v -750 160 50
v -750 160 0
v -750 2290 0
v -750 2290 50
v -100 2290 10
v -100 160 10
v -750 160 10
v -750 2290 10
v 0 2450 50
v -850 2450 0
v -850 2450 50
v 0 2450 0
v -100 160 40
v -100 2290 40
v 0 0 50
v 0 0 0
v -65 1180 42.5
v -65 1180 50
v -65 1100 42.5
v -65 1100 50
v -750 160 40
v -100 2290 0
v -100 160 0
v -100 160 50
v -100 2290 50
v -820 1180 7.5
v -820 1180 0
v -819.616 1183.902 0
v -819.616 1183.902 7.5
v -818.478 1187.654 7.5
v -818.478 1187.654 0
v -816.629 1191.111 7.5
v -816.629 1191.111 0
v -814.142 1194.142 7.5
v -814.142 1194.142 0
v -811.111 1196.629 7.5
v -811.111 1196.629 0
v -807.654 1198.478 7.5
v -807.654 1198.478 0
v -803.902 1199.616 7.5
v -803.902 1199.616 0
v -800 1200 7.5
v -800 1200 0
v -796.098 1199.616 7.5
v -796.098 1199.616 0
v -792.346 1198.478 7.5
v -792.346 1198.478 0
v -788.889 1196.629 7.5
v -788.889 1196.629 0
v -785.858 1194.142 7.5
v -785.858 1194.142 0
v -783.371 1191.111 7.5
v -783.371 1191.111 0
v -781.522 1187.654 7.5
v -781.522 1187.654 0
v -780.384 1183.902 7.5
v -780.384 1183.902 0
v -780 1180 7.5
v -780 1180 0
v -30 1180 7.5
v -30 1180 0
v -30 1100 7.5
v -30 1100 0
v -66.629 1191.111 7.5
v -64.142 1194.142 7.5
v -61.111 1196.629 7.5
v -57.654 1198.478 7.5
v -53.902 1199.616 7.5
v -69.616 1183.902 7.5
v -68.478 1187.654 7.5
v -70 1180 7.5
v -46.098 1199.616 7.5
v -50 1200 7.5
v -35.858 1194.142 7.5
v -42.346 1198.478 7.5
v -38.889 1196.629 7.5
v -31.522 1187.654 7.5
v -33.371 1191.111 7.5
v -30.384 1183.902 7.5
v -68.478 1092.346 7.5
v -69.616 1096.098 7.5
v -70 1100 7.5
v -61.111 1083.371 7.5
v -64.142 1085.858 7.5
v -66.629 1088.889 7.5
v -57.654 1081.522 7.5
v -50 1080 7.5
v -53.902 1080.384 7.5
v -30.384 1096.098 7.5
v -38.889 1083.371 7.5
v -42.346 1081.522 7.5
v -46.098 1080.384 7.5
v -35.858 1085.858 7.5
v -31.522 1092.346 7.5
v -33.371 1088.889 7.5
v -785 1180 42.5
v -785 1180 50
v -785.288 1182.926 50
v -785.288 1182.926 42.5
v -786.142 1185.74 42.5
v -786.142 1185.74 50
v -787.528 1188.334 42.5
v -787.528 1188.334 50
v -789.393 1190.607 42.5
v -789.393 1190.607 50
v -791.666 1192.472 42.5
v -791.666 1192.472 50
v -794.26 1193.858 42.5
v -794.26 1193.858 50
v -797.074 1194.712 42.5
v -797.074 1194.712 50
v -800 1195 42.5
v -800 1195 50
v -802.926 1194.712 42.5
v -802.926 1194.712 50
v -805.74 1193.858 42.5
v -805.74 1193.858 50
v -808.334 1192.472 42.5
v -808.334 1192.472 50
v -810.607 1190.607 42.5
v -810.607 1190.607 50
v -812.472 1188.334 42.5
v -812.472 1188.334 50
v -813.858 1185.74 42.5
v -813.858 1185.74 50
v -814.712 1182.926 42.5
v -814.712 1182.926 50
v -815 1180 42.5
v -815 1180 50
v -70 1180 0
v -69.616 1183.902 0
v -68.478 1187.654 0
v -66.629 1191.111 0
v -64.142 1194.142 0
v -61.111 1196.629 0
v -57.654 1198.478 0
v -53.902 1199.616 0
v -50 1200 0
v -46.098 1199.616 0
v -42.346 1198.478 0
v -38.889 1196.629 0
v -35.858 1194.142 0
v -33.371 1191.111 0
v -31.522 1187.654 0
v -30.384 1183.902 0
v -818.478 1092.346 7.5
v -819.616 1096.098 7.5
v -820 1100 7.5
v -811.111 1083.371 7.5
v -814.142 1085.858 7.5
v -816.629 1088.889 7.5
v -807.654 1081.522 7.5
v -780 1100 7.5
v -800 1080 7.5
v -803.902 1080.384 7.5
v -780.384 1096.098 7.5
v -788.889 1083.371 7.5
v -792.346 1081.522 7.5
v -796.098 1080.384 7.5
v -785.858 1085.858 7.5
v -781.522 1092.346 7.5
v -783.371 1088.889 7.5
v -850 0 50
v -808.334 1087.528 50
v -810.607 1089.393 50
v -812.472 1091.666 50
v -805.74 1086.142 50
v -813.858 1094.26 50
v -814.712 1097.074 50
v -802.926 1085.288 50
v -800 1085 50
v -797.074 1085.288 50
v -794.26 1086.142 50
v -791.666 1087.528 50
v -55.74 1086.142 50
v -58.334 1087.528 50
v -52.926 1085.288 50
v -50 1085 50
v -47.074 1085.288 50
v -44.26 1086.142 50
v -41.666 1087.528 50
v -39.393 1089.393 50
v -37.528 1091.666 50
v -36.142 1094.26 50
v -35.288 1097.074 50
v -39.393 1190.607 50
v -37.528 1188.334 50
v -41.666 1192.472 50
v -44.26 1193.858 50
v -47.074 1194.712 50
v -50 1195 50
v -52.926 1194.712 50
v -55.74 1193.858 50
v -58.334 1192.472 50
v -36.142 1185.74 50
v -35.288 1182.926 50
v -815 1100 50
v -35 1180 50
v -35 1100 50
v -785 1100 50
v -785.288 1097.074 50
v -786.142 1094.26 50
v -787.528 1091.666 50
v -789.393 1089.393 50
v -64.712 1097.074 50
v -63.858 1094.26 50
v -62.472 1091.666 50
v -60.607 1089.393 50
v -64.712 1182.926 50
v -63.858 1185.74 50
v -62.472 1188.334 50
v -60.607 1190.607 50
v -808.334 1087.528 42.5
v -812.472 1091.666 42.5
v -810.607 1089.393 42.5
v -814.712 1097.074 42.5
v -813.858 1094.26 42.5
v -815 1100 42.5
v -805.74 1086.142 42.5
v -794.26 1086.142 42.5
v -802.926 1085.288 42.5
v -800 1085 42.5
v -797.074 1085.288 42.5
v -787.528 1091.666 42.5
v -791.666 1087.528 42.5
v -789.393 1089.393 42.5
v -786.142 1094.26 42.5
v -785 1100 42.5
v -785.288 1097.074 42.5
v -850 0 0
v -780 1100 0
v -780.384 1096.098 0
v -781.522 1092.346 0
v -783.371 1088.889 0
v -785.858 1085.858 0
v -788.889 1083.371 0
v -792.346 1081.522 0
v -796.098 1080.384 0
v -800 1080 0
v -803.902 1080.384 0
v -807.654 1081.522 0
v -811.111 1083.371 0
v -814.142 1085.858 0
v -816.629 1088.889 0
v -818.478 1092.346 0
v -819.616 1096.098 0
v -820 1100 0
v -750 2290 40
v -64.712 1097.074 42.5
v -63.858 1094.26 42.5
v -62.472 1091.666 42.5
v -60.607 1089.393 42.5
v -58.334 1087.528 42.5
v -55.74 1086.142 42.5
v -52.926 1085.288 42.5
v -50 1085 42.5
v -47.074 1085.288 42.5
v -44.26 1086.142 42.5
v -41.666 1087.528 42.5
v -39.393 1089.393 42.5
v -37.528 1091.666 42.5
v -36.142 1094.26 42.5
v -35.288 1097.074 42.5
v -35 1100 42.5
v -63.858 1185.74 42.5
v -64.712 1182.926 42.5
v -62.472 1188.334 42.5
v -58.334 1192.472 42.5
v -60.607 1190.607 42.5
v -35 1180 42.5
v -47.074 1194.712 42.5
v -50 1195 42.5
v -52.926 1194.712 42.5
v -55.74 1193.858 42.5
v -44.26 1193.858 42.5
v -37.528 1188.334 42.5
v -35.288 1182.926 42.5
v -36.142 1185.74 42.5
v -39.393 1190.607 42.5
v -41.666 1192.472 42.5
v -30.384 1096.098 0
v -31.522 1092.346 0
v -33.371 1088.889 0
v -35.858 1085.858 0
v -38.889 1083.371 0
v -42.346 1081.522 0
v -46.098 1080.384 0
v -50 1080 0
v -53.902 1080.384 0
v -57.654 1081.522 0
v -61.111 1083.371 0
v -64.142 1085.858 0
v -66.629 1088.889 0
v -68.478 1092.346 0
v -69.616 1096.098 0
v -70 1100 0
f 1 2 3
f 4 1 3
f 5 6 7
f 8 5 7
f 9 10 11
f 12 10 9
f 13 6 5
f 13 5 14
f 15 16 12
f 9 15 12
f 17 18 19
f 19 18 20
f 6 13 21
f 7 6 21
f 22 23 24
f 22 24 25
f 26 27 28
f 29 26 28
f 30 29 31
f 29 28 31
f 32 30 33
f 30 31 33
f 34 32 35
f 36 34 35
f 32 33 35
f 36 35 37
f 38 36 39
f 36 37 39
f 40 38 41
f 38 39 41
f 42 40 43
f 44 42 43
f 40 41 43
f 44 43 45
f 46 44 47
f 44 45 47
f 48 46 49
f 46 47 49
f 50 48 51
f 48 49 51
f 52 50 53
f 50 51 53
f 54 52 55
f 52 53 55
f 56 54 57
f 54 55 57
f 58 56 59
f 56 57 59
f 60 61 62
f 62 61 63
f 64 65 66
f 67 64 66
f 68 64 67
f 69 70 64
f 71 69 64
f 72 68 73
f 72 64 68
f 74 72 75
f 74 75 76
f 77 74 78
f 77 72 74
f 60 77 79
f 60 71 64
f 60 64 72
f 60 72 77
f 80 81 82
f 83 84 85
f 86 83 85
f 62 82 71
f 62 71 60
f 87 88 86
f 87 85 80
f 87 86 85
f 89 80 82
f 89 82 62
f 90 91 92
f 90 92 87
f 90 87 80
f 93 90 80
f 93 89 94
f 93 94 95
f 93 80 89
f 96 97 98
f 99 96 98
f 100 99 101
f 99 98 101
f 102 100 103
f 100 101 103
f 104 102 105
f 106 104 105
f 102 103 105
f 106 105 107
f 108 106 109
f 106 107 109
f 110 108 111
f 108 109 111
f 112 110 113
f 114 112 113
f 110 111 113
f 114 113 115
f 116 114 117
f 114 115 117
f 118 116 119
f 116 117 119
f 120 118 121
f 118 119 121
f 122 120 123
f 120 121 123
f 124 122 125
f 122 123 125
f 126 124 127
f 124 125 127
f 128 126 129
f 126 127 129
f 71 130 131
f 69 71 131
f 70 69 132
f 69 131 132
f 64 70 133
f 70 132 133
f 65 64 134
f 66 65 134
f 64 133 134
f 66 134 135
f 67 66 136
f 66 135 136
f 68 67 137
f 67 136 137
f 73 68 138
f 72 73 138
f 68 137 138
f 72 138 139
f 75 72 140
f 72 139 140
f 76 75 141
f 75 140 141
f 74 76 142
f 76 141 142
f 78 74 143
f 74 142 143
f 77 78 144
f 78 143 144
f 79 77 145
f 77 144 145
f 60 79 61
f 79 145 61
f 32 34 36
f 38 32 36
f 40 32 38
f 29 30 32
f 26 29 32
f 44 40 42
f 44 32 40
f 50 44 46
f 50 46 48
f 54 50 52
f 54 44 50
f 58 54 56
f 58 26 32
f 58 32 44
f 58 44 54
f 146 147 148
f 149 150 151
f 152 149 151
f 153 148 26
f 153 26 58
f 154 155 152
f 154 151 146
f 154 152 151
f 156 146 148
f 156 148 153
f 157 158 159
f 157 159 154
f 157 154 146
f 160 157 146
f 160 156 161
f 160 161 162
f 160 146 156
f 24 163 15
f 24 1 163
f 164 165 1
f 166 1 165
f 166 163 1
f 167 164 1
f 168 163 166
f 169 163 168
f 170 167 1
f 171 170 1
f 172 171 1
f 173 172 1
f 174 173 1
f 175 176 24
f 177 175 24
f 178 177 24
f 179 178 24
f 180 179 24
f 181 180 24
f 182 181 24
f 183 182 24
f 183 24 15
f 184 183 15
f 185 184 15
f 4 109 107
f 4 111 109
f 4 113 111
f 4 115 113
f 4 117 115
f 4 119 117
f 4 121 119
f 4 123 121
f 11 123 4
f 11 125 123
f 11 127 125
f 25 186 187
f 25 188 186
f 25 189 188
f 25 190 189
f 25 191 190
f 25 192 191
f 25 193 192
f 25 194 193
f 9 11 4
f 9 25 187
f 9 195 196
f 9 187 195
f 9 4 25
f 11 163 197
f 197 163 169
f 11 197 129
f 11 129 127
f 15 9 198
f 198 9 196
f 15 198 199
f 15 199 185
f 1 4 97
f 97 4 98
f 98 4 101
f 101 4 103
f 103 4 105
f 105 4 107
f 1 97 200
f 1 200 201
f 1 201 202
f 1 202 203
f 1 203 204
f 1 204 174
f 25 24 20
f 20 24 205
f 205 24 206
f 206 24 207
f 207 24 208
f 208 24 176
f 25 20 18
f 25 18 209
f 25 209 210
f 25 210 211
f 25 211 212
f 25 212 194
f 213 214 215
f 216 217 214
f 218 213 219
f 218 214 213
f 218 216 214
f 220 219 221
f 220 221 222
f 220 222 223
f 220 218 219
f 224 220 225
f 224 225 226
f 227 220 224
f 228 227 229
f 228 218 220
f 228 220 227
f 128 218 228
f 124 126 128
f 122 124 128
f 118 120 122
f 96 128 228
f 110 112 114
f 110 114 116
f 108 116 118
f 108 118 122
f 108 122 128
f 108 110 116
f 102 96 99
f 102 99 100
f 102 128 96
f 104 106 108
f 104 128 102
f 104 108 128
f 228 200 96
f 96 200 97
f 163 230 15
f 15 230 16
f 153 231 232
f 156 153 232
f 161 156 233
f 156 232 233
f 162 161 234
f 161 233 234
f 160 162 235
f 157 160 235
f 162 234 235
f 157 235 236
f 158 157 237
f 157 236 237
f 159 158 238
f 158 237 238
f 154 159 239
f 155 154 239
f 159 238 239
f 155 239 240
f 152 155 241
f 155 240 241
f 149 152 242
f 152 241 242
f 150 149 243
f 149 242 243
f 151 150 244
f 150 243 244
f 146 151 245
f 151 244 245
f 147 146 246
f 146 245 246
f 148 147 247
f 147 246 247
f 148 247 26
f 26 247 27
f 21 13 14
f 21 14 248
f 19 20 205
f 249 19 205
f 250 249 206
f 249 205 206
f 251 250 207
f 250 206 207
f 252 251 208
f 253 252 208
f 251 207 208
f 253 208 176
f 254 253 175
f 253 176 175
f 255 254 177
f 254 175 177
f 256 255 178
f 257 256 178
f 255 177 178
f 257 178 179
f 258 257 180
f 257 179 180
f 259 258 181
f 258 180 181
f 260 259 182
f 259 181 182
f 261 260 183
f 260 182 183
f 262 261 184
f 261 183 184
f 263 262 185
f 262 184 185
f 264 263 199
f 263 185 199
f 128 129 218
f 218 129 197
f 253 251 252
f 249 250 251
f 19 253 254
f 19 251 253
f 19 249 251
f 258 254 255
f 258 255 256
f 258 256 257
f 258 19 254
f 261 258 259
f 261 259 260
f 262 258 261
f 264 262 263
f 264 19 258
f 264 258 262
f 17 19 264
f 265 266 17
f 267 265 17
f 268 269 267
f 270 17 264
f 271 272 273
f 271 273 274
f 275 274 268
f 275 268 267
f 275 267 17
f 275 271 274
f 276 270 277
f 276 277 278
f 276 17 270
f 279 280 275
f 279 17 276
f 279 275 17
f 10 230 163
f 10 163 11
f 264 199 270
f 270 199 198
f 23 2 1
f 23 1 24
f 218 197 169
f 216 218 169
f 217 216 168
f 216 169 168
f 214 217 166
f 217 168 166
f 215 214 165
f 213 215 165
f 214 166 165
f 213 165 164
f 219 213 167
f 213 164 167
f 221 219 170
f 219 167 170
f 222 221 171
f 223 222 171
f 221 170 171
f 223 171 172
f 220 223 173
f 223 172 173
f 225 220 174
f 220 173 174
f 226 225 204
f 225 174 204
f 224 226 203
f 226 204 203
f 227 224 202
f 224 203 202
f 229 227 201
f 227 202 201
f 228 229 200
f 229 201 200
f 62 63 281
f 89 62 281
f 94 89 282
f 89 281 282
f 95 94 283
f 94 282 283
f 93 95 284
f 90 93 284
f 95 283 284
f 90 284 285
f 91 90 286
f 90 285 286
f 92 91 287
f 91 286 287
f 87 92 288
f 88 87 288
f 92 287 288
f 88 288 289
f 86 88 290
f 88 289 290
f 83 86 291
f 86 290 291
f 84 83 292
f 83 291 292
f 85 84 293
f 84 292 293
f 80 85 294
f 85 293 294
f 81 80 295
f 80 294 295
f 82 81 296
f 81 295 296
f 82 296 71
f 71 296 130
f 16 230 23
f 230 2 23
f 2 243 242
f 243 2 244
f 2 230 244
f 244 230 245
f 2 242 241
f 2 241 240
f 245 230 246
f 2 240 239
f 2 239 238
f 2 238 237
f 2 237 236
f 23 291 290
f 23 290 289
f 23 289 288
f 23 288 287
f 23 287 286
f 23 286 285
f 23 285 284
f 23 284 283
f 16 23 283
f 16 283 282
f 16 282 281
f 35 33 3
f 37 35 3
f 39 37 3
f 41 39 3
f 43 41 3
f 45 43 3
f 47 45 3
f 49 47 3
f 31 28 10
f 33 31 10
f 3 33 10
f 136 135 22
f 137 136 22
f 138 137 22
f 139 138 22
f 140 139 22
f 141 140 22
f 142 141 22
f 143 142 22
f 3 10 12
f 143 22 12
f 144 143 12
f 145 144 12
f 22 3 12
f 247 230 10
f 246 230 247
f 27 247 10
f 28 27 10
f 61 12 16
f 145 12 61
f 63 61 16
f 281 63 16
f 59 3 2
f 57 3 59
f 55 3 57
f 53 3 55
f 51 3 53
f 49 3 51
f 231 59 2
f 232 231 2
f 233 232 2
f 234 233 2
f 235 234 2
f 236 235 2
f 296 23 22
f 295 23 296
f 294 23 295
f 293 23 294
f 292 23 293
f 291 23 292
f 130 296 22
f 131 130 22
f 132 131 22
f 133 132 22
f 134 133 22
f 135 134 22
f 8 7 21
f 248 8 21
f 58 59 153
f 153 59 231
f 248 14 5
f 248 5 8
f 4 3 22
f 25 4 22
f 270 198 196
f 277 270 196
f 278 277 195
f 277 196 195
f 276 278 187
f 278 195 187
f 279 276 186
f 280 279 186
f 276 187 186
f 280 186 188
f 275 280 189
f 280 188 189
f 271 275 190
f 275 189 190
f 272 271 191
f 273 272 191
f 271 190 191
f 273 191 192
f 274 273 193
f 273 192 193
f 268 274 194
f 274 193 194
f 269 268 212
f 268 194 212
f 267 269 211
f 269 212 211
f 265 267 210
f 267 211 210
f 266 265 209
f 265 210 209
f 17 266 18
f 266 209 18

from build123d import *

# Parameters (mm, degrees)
F0_W     = 850
F0_H     = 2450
F0_W_2   = 650
F0_H_2   = 2130
F1_DEPTH = 50
F2_W     = 650
F2_H     = 30
F3_DEPTH = 2130
F5_DEPTH = 7.5
F7_DEPTH = 7.5


with BuildPart() as f1:
    # F0 (on Top) → F1 (new body)
    with BuildSketch(Plane.XY):
        with Locations((-425, 1225)):
            Rectangle(F0_W, F0_H)
        with Locations((-425, 1225)):
            Rectangle(F0_W_2, F0_H_2, mode=Mode.SUBTRACT)
    extrude(amount=F1_DEPTH)

    # F4 (on face) → F5 (cut)
    with BuildSketch(Plane.XY.offset(50)):
        with BuildLine():
            ThreePointArc((-785, 1180), (-800, 1195), (-815, 1180))
            Line((-815, 1180), (-815, 1100))
            ThreePointArc((-815, 1100), (-800, 1085), (-785, 1100))
            Line((-785, 1100), (-785, 1180))
        make_face()
        with BuildLine():
            Line((-65, 1180), (-65, 1100))
            ThreePointArc((-65, 1100), (-50, 1085), (-35, 1100))
            Line((-35, 1100), (-35, 1180))
            ThreePointArc((-35, 1180), (-50, 1195), (-65, 1180))
        make_face()
    extrude(amount=-F5_DEPTH, mode=Mode.SUBTRACT)

    # F6 (on face) → F7 (cut)
    with BuildSketch(Plane(origin=(0, 0, 0), x_dir=(1, 0, 0), z_dir=(0, 0, -1))):
        with BuildLine():
            ThreePointArc((-70, -1180), (-50, -1200), (-30, -1180))
            Line((-30, -1180), (-30, -1100))
            ThreePointArc((-30, -1100), (-50, -1080), (-70, -1100))
            Line((-70, -1100), (-70, -1180))
        make_face()
        with BuildLine():
            ThreePointArc((-820, -1180), (-800, -1200), (-780, -1180))
            Line((-780, -1180), (-780, -1100))
            ThreePointArc((-780, -1100), (-800, -1080), (-820, -1100))
            Line((-820, -1100), (-820, -1180))
        make_face()
    extrude(amount=-F7_DEPTH, mode=Mode.SUBTRACT)


with BuildPart() as f3:
    # F2 (on face) → F3 (new body)
    with BuildSketch(Plane(origin=(0, 160, 0), x_dir=(-1, 0, 0), z_dir=(0, 1, 0))):
        with Locations((425, 25)):
            Rectangle(F2_W, F2_H)
    extrude(amount=F3_DEPTH)


solid = Compound([f1.part, f3.part])
